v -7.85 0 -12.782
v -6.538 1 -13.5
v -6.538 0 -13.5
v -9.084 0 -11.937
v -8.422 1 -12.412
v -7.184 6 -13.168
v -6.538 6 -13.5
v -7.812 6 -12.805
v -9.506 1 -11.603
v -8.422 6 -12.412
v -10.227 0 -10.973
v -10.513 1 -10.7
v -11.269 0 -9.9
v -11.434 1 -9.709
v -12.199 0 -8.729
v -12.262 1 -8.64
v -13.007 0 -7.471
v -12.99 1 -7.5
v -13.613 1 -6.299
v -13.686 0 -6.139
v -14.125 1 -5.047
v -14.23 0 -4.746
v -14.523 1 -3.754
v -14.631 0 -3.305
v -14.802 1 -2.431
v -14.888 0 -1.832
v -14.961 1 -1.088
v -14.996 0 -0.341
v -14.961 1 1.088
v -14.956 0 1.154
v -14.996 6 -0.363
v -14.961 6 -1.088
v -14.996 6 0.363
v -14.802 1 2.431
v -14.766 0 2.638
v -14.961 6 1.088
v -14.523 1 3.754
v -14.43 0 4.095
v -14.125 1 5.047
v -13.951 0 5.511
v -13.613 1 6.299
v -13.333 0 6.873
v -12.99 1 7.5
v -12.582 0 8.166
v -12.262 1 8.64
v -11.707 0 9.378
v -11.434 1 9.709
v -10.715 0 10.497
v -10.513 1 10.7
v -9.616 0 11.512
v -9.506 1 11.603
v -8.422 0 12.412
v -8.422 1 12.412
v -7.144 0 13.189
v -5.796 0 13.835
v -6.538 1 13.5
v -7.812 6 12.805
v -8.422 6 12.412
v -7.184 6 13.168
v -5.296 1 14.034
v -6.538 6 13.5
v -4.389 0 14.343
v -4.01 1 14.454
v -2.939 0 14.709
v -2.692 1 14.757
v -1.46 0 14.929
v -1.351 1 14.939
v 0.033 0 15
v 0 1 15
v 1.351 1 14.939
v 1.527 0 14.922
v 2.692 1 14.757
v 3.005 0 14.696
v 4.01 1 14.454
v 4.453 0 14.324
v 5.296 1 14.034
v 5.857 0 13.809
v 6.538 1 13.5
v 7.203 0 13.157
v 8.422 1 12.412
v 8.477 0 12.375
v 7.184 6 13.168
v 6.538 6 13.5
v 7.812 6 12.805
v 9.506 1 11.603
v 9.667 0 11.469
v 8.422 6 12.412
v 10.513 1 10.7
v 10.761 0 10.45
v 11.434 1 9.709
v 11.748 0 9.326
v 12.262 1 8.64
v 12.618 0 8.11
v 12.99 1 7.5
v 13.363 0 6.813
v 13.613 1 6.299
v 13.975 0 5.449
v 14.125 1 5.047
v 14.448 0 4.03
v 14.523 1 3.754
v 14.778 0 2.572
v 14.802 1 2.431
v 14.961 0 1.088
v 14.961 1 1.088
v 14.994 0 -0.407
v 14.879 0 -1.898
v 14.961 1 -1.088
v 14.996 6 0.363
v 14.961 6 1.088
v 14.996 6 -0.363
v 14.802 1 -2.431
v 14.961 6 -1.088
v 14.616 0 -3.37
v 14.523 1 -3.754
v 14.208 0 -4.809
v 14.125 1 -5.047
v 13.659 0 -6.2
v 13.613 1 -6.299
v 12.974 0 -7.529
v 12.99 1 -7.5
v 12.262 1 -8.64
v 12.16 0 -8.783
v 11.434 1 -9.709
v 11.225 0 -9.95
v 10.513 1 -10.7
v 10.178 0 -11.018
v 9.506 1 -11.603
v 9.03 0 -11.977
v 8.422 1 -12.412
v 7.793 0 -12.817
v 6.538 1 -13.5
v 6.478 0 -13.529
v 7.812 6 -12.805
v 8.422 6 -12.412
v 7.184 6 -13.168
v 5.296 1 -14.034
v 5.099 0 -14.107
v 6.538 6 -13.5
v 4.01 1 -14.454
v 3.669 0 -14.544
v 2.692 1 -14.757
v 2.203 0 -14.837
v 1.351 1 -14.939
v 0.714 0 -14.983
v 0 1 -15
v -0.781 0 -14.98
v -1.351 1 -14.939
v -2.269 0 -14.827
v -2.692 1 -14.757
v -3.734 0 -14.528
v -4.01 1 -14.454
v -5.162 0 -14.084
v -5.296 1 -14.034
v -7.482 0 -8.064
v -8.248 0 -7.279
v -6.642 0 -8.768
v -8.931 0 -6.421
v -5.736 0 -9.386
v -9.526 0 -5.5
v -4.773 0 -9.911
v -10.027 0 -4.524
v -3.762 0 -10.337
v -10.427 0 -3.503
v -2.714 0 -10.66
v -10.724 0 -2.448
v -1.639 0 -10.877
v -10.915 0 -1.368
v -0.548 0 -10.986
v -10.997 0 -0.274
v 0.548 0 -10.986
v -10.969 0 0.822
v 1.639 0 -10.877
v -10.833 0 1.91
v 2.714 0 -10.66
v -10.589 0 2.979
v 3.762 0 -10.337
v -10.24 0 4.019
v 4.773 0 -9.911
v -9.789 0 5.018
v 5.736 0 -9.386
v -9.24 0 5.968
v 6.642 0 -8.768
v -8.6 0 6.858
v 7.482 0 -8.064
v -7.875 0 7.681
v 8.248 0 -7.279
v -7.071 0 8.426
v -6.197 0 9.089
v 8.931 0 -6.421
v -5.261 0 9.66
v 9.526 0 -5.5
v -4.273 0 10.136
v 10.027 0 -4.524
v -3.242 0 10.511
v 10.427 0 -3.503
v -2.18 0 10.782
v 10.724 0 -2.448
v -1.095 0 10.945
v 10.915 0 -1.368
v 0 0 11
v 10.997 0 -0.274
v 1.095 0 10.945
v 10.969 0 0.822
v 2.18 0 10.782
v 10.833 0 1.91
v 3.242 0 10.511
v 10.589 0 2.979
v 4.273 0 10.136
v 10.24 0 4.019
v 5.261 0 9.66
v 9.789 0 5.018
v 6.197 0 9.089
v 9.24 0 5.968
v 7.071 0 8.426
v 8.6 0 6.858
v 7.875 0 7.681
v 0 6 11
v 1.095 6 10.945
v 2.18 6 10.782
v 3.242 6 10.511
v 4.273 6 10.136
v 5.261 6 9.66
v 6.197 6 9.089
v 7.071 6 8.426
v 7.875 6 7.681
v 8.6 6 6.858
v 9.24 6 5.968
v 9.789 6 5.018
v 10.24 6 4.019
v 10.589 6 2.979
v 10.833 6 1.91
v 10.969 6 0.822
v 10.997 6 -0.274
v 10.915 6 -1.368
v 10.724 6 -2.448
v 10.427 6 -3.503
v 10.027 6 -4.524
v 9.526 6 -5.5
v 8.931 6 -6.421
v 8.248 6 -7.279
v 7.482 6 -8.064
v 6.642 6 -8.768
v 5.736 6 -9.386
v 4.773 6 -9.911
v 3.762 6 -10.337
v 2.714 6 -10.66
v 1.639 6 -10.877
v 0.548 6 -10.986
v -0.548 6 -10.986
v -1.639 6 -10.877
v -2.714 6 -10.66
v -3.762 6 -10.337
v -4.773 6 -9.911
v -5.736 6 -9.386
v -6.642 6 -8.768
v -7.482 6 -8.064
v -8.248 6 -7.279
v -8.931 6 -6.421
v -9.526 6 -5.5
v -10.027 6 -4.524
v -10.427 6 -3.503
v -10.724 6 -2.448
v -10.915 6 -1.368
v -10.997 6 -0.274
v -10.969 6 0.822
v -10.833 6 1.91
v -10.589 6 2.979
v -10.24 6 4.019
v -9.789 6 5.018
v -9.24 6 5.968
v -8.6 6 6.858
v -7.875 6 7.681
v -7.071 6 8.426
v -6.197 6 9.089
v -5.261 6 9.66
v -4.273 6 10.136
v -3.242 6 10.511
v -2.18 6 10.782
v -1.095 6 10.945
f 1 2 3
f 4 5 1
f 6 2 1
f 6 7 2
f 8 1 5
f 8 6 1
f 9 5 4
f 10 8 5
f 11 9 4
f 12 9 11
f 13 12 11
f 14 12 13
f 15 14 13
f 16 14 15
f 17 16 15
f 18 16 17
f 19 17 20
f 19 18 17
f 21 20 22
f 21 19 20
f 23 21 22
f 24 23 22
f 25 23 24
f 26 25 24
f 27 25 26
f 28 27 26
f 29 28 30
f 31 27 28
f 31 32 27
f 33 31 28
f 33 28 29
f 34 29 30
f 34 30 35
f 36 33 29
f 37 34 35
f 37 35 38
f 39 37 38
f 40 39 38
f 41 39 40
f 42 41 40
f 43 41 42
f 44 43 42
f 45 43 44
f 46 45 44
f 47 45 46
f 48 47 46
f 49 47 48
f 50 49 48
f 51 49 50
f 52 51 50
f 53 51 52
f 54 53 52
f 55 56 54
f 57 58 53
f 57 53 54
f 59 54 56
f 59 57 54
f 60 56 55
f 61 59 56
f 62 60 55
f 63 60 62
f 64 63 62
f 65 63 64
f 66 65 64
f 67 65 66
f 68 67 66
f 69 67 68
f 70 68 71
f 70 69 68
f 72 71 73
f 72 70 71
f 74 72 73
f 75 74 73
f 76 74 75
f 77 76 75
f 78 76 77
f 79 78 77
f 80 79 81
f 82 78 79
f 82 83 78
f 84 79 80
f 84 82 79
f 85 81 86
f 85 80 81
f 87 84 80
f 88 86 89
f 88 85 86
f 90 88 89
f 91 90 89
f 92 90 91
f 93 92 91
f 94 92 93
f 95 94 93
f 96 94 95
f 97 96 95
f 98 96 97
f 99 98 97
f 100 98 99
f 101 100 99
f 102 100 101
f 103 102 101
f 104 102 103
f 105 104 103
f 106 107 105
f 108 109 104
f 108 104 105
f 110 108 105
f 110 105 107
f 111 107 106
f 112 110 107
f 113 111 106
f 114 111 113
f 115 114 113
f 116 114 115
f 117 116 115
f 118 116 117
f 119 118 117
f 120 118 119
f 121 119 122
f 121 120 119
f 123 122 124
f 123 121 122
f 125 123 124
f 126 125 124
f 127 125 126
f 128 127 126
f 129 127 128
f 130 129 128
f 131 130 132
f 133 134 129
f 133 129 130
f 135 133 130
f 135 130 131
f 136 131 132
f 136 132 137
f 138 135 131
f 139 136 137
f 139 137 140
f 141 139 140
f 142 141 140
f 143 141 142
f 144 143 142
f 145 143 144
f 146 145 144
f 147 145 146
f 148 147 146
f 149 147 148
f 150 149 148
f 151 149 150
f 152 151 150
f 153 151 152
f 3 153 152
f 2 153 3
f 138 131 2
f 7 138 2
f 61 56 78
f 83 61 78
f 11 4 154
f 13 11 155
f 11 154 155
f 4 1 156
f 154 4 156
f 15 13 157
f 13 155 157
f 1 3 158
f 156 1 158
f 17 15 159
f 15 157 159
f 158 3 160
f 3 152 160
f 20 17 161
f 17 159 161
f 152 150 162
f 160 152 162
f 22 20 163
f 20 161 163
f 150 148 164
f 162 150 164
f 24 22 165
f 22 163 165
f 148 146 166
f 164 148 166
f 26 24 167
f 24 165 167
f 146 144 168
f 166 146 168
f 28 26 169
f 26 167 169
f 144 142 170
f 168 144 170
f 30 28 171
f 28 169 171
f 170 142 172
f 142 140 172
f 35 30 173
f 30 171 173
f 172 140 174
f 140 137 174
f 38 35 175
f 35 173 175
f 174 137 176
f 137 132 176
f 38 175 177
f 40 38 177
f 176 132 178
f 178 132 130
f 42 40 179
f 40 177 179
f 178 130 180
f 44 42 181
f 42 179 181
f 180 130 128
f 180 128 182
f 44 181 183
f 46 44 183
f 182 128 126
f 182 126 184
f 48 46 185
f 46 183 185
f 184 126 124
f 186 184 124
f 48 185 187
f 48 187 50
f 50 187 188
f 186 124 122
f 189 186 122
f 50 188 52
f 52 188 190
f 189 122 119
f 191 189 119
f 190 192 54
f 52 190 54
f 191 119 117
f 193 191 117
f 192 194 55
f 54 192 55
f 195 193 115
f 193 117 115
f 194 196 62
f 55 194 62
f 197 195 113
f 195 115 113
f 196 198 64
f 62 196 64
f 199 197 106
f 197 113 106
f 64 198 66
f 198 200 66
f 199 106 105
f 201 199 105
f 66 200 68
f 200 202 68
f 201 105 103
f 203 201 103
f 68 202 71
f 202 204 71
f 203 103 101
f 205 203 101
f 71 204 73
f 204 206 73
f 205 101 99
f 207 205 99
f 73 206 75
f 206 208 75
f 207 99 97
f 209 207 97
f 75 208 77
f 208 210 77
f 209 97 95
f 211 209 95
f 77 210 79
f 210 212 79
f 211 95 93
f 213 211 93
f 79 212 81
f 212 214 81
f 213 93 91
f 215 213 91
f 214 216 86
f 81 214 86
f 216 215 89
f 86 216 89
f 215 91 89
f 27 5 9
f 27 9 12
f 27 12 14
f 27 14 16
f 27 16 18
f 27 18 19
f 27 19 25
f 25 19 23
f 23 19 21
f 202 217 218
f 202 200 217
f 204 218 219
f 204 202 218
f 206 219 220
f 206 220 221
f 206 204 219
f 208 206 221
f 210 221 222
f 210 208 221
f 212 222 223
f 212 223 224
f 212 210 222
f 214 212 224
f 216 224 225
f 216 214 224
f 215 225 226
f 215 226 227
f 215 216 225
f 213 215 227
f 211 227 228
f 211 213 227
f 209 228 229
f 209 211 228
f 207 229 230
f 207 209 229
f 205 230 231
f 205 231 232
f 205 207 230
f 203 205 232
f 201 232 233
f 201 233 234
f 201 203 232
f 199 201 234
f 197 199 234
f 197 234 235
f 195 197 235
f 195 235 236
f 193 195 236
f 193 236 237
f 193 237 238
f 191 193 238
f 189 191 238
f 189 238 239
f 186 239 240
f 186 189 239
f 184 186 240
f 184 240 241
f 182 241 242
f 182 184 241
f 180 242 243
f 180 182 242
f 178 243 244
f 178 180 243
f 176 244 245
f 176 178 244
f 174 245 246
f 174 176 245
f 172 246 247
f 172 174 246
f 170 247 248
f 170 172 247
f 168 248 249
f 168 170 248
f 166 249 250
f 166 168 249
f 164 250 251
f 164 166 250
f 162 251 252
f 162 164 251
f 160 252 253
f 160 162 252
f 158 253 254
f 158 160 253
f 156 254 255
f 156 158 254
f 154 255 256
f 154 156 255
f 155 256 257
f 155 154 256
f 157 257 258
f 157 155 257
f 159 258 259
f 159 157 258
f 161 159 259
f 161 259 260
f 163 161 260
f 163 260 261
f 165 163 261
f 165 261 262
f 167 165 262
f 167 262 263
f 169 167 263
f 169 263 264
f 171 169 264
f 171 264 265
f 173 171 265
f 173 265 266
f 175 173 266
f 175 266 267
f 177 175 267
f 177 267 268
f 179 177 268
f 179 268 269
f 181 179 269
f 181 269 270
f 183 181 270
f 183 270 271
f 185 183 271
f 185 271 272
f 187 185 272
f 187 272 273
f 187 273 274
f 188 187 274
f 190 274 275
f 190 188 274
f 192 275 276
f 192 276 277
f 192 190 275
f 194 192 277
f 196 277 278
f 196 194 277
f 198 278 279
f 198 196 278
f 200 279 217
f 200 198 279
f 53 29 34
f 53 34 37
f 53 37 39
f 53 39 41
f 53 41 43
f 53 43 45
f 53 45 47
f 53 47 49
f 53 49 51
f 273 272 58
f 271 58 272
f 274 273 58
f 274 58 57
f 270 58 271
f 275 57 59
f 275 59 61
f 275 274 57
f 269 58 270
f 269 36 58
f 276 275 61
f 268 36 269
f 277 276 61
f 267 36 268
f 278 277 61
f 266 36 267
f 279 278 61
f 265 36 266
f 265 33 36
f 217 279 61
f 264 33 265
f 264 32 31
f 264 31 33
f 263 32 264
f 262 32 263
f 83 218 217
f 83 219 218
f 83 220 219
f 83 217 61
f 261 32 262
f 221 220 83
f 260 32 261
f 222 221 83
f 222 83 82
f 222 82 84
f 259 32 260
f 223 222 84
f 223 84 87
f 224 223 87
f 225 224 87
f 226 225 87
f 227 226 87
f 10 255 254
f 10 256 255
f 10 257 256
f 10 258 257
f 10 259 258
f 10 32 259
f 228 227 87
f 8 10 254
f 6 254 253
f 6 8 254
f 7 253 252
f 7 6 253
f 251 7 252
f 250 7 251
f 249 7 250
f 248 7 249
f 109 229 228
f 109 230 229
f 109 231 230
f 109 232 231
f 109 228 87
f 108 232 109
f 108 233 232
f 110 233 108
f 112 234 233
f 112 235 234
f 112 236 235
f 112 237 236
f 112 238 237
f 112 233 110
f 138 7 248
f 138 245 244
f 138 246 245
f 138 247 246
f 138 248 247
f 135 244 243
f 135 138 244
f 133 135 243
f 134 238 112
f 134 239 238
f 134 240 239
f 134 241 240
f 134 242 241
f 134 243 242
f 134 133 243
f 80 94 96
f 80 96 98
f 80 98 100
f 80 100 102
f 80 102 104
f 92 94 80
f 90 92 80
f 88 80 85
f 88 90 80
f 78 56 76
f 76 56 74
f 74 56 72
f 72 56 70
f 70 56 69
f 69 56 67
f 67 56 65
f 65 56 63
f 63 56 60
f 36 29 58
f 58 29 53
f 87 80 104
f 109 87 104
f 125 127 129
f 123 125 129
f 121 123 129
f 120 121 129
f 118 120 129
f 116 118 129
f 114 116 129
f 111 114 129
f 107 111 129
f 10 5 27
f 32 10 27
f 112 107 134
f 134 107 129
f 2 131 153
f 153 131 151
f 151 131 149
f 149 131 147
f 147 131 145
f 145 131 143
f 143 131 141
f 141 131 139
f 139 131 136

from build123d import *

# Parameters (mm, degrees)
SKIZZE1_R                       = 15
SKIZZE1_R_2                     = 11
AUFSATZ_LINEAR_AUSTRAGEN1_DEPTH = 1
SKIZZE2_R                       = 11
AUFSATZ_LINEAR_AUSTRAGEN2_DEPTH = 5
SKIZZE3_R                       = 15.588457268
SKIZZE3_R_2                     = 15
SCHNITT_LINEAR_AUSTRAGEN2_DEPTH = 23.449944321


with BuildPart() as part:
    # Skizze1 → Aufsatz-Linear austragen1 (new body)
    with BuildSketch(Plane(origin=(0, 0, 0), x_dir=(1, 0, 0), z_dir=(0, 1, 0))):
        with Locations(Location((0, 0, 0), (0, 0, 270))):
            Circle(SKIZZE1_R)
        with Locations(Location((0, 0, 0), (0, 0, 270))):
            Circle(SKIZZE1_R_2, mode=Mode.SUBTRACT)
    extrude(amount=AUFSATZ_LINEAR_AUSTRAGEN1_DEPTH)

    # Skizze2 → Aufsatz-Linear austragen2 (add)
    with BuildSketch(Plane(origin=(0, 1, 0), x_dir=(1, 0, 0), z_dir=(0, 1, 0))):
        Polygon((15.588457268, 0), (7.794228634, 13.5), (-7.794228634, 13.5), (-15.588457268, 0), (-7.794228634, -13.5), (7.794228634, -13.5), align=None)
        with Locations(Location((0, 0, 0), (0, 0, 270))):
            Circle(SKIZZE2_R, mode=Mode.SUBTRACT)
    extrude(amount=AUFSATZ_LINEAR_AUSTRAGEN2_DEPTH)

    # Skizze3 → Schnitt-Linear austragen2 (cut, through all)
    with BuildSketch(Plane(origin=(0, 6, 0), x_dir=(1, 0, 0), z_dir=(0, 1, 0))):
        Circle(SKIZZE3_R)
        with Locations(Location((0, 0, 0), (0, 0, 115.841932763))):
            Circle(SKIZZE3_R_2, mode=Mode.SUBTRACT)
    extrude(amount=-SCHNITT_LINEAR_AUSTRAGEN2_DEPTH, mode=Mode.SUBTRACT)


solid = part.part
